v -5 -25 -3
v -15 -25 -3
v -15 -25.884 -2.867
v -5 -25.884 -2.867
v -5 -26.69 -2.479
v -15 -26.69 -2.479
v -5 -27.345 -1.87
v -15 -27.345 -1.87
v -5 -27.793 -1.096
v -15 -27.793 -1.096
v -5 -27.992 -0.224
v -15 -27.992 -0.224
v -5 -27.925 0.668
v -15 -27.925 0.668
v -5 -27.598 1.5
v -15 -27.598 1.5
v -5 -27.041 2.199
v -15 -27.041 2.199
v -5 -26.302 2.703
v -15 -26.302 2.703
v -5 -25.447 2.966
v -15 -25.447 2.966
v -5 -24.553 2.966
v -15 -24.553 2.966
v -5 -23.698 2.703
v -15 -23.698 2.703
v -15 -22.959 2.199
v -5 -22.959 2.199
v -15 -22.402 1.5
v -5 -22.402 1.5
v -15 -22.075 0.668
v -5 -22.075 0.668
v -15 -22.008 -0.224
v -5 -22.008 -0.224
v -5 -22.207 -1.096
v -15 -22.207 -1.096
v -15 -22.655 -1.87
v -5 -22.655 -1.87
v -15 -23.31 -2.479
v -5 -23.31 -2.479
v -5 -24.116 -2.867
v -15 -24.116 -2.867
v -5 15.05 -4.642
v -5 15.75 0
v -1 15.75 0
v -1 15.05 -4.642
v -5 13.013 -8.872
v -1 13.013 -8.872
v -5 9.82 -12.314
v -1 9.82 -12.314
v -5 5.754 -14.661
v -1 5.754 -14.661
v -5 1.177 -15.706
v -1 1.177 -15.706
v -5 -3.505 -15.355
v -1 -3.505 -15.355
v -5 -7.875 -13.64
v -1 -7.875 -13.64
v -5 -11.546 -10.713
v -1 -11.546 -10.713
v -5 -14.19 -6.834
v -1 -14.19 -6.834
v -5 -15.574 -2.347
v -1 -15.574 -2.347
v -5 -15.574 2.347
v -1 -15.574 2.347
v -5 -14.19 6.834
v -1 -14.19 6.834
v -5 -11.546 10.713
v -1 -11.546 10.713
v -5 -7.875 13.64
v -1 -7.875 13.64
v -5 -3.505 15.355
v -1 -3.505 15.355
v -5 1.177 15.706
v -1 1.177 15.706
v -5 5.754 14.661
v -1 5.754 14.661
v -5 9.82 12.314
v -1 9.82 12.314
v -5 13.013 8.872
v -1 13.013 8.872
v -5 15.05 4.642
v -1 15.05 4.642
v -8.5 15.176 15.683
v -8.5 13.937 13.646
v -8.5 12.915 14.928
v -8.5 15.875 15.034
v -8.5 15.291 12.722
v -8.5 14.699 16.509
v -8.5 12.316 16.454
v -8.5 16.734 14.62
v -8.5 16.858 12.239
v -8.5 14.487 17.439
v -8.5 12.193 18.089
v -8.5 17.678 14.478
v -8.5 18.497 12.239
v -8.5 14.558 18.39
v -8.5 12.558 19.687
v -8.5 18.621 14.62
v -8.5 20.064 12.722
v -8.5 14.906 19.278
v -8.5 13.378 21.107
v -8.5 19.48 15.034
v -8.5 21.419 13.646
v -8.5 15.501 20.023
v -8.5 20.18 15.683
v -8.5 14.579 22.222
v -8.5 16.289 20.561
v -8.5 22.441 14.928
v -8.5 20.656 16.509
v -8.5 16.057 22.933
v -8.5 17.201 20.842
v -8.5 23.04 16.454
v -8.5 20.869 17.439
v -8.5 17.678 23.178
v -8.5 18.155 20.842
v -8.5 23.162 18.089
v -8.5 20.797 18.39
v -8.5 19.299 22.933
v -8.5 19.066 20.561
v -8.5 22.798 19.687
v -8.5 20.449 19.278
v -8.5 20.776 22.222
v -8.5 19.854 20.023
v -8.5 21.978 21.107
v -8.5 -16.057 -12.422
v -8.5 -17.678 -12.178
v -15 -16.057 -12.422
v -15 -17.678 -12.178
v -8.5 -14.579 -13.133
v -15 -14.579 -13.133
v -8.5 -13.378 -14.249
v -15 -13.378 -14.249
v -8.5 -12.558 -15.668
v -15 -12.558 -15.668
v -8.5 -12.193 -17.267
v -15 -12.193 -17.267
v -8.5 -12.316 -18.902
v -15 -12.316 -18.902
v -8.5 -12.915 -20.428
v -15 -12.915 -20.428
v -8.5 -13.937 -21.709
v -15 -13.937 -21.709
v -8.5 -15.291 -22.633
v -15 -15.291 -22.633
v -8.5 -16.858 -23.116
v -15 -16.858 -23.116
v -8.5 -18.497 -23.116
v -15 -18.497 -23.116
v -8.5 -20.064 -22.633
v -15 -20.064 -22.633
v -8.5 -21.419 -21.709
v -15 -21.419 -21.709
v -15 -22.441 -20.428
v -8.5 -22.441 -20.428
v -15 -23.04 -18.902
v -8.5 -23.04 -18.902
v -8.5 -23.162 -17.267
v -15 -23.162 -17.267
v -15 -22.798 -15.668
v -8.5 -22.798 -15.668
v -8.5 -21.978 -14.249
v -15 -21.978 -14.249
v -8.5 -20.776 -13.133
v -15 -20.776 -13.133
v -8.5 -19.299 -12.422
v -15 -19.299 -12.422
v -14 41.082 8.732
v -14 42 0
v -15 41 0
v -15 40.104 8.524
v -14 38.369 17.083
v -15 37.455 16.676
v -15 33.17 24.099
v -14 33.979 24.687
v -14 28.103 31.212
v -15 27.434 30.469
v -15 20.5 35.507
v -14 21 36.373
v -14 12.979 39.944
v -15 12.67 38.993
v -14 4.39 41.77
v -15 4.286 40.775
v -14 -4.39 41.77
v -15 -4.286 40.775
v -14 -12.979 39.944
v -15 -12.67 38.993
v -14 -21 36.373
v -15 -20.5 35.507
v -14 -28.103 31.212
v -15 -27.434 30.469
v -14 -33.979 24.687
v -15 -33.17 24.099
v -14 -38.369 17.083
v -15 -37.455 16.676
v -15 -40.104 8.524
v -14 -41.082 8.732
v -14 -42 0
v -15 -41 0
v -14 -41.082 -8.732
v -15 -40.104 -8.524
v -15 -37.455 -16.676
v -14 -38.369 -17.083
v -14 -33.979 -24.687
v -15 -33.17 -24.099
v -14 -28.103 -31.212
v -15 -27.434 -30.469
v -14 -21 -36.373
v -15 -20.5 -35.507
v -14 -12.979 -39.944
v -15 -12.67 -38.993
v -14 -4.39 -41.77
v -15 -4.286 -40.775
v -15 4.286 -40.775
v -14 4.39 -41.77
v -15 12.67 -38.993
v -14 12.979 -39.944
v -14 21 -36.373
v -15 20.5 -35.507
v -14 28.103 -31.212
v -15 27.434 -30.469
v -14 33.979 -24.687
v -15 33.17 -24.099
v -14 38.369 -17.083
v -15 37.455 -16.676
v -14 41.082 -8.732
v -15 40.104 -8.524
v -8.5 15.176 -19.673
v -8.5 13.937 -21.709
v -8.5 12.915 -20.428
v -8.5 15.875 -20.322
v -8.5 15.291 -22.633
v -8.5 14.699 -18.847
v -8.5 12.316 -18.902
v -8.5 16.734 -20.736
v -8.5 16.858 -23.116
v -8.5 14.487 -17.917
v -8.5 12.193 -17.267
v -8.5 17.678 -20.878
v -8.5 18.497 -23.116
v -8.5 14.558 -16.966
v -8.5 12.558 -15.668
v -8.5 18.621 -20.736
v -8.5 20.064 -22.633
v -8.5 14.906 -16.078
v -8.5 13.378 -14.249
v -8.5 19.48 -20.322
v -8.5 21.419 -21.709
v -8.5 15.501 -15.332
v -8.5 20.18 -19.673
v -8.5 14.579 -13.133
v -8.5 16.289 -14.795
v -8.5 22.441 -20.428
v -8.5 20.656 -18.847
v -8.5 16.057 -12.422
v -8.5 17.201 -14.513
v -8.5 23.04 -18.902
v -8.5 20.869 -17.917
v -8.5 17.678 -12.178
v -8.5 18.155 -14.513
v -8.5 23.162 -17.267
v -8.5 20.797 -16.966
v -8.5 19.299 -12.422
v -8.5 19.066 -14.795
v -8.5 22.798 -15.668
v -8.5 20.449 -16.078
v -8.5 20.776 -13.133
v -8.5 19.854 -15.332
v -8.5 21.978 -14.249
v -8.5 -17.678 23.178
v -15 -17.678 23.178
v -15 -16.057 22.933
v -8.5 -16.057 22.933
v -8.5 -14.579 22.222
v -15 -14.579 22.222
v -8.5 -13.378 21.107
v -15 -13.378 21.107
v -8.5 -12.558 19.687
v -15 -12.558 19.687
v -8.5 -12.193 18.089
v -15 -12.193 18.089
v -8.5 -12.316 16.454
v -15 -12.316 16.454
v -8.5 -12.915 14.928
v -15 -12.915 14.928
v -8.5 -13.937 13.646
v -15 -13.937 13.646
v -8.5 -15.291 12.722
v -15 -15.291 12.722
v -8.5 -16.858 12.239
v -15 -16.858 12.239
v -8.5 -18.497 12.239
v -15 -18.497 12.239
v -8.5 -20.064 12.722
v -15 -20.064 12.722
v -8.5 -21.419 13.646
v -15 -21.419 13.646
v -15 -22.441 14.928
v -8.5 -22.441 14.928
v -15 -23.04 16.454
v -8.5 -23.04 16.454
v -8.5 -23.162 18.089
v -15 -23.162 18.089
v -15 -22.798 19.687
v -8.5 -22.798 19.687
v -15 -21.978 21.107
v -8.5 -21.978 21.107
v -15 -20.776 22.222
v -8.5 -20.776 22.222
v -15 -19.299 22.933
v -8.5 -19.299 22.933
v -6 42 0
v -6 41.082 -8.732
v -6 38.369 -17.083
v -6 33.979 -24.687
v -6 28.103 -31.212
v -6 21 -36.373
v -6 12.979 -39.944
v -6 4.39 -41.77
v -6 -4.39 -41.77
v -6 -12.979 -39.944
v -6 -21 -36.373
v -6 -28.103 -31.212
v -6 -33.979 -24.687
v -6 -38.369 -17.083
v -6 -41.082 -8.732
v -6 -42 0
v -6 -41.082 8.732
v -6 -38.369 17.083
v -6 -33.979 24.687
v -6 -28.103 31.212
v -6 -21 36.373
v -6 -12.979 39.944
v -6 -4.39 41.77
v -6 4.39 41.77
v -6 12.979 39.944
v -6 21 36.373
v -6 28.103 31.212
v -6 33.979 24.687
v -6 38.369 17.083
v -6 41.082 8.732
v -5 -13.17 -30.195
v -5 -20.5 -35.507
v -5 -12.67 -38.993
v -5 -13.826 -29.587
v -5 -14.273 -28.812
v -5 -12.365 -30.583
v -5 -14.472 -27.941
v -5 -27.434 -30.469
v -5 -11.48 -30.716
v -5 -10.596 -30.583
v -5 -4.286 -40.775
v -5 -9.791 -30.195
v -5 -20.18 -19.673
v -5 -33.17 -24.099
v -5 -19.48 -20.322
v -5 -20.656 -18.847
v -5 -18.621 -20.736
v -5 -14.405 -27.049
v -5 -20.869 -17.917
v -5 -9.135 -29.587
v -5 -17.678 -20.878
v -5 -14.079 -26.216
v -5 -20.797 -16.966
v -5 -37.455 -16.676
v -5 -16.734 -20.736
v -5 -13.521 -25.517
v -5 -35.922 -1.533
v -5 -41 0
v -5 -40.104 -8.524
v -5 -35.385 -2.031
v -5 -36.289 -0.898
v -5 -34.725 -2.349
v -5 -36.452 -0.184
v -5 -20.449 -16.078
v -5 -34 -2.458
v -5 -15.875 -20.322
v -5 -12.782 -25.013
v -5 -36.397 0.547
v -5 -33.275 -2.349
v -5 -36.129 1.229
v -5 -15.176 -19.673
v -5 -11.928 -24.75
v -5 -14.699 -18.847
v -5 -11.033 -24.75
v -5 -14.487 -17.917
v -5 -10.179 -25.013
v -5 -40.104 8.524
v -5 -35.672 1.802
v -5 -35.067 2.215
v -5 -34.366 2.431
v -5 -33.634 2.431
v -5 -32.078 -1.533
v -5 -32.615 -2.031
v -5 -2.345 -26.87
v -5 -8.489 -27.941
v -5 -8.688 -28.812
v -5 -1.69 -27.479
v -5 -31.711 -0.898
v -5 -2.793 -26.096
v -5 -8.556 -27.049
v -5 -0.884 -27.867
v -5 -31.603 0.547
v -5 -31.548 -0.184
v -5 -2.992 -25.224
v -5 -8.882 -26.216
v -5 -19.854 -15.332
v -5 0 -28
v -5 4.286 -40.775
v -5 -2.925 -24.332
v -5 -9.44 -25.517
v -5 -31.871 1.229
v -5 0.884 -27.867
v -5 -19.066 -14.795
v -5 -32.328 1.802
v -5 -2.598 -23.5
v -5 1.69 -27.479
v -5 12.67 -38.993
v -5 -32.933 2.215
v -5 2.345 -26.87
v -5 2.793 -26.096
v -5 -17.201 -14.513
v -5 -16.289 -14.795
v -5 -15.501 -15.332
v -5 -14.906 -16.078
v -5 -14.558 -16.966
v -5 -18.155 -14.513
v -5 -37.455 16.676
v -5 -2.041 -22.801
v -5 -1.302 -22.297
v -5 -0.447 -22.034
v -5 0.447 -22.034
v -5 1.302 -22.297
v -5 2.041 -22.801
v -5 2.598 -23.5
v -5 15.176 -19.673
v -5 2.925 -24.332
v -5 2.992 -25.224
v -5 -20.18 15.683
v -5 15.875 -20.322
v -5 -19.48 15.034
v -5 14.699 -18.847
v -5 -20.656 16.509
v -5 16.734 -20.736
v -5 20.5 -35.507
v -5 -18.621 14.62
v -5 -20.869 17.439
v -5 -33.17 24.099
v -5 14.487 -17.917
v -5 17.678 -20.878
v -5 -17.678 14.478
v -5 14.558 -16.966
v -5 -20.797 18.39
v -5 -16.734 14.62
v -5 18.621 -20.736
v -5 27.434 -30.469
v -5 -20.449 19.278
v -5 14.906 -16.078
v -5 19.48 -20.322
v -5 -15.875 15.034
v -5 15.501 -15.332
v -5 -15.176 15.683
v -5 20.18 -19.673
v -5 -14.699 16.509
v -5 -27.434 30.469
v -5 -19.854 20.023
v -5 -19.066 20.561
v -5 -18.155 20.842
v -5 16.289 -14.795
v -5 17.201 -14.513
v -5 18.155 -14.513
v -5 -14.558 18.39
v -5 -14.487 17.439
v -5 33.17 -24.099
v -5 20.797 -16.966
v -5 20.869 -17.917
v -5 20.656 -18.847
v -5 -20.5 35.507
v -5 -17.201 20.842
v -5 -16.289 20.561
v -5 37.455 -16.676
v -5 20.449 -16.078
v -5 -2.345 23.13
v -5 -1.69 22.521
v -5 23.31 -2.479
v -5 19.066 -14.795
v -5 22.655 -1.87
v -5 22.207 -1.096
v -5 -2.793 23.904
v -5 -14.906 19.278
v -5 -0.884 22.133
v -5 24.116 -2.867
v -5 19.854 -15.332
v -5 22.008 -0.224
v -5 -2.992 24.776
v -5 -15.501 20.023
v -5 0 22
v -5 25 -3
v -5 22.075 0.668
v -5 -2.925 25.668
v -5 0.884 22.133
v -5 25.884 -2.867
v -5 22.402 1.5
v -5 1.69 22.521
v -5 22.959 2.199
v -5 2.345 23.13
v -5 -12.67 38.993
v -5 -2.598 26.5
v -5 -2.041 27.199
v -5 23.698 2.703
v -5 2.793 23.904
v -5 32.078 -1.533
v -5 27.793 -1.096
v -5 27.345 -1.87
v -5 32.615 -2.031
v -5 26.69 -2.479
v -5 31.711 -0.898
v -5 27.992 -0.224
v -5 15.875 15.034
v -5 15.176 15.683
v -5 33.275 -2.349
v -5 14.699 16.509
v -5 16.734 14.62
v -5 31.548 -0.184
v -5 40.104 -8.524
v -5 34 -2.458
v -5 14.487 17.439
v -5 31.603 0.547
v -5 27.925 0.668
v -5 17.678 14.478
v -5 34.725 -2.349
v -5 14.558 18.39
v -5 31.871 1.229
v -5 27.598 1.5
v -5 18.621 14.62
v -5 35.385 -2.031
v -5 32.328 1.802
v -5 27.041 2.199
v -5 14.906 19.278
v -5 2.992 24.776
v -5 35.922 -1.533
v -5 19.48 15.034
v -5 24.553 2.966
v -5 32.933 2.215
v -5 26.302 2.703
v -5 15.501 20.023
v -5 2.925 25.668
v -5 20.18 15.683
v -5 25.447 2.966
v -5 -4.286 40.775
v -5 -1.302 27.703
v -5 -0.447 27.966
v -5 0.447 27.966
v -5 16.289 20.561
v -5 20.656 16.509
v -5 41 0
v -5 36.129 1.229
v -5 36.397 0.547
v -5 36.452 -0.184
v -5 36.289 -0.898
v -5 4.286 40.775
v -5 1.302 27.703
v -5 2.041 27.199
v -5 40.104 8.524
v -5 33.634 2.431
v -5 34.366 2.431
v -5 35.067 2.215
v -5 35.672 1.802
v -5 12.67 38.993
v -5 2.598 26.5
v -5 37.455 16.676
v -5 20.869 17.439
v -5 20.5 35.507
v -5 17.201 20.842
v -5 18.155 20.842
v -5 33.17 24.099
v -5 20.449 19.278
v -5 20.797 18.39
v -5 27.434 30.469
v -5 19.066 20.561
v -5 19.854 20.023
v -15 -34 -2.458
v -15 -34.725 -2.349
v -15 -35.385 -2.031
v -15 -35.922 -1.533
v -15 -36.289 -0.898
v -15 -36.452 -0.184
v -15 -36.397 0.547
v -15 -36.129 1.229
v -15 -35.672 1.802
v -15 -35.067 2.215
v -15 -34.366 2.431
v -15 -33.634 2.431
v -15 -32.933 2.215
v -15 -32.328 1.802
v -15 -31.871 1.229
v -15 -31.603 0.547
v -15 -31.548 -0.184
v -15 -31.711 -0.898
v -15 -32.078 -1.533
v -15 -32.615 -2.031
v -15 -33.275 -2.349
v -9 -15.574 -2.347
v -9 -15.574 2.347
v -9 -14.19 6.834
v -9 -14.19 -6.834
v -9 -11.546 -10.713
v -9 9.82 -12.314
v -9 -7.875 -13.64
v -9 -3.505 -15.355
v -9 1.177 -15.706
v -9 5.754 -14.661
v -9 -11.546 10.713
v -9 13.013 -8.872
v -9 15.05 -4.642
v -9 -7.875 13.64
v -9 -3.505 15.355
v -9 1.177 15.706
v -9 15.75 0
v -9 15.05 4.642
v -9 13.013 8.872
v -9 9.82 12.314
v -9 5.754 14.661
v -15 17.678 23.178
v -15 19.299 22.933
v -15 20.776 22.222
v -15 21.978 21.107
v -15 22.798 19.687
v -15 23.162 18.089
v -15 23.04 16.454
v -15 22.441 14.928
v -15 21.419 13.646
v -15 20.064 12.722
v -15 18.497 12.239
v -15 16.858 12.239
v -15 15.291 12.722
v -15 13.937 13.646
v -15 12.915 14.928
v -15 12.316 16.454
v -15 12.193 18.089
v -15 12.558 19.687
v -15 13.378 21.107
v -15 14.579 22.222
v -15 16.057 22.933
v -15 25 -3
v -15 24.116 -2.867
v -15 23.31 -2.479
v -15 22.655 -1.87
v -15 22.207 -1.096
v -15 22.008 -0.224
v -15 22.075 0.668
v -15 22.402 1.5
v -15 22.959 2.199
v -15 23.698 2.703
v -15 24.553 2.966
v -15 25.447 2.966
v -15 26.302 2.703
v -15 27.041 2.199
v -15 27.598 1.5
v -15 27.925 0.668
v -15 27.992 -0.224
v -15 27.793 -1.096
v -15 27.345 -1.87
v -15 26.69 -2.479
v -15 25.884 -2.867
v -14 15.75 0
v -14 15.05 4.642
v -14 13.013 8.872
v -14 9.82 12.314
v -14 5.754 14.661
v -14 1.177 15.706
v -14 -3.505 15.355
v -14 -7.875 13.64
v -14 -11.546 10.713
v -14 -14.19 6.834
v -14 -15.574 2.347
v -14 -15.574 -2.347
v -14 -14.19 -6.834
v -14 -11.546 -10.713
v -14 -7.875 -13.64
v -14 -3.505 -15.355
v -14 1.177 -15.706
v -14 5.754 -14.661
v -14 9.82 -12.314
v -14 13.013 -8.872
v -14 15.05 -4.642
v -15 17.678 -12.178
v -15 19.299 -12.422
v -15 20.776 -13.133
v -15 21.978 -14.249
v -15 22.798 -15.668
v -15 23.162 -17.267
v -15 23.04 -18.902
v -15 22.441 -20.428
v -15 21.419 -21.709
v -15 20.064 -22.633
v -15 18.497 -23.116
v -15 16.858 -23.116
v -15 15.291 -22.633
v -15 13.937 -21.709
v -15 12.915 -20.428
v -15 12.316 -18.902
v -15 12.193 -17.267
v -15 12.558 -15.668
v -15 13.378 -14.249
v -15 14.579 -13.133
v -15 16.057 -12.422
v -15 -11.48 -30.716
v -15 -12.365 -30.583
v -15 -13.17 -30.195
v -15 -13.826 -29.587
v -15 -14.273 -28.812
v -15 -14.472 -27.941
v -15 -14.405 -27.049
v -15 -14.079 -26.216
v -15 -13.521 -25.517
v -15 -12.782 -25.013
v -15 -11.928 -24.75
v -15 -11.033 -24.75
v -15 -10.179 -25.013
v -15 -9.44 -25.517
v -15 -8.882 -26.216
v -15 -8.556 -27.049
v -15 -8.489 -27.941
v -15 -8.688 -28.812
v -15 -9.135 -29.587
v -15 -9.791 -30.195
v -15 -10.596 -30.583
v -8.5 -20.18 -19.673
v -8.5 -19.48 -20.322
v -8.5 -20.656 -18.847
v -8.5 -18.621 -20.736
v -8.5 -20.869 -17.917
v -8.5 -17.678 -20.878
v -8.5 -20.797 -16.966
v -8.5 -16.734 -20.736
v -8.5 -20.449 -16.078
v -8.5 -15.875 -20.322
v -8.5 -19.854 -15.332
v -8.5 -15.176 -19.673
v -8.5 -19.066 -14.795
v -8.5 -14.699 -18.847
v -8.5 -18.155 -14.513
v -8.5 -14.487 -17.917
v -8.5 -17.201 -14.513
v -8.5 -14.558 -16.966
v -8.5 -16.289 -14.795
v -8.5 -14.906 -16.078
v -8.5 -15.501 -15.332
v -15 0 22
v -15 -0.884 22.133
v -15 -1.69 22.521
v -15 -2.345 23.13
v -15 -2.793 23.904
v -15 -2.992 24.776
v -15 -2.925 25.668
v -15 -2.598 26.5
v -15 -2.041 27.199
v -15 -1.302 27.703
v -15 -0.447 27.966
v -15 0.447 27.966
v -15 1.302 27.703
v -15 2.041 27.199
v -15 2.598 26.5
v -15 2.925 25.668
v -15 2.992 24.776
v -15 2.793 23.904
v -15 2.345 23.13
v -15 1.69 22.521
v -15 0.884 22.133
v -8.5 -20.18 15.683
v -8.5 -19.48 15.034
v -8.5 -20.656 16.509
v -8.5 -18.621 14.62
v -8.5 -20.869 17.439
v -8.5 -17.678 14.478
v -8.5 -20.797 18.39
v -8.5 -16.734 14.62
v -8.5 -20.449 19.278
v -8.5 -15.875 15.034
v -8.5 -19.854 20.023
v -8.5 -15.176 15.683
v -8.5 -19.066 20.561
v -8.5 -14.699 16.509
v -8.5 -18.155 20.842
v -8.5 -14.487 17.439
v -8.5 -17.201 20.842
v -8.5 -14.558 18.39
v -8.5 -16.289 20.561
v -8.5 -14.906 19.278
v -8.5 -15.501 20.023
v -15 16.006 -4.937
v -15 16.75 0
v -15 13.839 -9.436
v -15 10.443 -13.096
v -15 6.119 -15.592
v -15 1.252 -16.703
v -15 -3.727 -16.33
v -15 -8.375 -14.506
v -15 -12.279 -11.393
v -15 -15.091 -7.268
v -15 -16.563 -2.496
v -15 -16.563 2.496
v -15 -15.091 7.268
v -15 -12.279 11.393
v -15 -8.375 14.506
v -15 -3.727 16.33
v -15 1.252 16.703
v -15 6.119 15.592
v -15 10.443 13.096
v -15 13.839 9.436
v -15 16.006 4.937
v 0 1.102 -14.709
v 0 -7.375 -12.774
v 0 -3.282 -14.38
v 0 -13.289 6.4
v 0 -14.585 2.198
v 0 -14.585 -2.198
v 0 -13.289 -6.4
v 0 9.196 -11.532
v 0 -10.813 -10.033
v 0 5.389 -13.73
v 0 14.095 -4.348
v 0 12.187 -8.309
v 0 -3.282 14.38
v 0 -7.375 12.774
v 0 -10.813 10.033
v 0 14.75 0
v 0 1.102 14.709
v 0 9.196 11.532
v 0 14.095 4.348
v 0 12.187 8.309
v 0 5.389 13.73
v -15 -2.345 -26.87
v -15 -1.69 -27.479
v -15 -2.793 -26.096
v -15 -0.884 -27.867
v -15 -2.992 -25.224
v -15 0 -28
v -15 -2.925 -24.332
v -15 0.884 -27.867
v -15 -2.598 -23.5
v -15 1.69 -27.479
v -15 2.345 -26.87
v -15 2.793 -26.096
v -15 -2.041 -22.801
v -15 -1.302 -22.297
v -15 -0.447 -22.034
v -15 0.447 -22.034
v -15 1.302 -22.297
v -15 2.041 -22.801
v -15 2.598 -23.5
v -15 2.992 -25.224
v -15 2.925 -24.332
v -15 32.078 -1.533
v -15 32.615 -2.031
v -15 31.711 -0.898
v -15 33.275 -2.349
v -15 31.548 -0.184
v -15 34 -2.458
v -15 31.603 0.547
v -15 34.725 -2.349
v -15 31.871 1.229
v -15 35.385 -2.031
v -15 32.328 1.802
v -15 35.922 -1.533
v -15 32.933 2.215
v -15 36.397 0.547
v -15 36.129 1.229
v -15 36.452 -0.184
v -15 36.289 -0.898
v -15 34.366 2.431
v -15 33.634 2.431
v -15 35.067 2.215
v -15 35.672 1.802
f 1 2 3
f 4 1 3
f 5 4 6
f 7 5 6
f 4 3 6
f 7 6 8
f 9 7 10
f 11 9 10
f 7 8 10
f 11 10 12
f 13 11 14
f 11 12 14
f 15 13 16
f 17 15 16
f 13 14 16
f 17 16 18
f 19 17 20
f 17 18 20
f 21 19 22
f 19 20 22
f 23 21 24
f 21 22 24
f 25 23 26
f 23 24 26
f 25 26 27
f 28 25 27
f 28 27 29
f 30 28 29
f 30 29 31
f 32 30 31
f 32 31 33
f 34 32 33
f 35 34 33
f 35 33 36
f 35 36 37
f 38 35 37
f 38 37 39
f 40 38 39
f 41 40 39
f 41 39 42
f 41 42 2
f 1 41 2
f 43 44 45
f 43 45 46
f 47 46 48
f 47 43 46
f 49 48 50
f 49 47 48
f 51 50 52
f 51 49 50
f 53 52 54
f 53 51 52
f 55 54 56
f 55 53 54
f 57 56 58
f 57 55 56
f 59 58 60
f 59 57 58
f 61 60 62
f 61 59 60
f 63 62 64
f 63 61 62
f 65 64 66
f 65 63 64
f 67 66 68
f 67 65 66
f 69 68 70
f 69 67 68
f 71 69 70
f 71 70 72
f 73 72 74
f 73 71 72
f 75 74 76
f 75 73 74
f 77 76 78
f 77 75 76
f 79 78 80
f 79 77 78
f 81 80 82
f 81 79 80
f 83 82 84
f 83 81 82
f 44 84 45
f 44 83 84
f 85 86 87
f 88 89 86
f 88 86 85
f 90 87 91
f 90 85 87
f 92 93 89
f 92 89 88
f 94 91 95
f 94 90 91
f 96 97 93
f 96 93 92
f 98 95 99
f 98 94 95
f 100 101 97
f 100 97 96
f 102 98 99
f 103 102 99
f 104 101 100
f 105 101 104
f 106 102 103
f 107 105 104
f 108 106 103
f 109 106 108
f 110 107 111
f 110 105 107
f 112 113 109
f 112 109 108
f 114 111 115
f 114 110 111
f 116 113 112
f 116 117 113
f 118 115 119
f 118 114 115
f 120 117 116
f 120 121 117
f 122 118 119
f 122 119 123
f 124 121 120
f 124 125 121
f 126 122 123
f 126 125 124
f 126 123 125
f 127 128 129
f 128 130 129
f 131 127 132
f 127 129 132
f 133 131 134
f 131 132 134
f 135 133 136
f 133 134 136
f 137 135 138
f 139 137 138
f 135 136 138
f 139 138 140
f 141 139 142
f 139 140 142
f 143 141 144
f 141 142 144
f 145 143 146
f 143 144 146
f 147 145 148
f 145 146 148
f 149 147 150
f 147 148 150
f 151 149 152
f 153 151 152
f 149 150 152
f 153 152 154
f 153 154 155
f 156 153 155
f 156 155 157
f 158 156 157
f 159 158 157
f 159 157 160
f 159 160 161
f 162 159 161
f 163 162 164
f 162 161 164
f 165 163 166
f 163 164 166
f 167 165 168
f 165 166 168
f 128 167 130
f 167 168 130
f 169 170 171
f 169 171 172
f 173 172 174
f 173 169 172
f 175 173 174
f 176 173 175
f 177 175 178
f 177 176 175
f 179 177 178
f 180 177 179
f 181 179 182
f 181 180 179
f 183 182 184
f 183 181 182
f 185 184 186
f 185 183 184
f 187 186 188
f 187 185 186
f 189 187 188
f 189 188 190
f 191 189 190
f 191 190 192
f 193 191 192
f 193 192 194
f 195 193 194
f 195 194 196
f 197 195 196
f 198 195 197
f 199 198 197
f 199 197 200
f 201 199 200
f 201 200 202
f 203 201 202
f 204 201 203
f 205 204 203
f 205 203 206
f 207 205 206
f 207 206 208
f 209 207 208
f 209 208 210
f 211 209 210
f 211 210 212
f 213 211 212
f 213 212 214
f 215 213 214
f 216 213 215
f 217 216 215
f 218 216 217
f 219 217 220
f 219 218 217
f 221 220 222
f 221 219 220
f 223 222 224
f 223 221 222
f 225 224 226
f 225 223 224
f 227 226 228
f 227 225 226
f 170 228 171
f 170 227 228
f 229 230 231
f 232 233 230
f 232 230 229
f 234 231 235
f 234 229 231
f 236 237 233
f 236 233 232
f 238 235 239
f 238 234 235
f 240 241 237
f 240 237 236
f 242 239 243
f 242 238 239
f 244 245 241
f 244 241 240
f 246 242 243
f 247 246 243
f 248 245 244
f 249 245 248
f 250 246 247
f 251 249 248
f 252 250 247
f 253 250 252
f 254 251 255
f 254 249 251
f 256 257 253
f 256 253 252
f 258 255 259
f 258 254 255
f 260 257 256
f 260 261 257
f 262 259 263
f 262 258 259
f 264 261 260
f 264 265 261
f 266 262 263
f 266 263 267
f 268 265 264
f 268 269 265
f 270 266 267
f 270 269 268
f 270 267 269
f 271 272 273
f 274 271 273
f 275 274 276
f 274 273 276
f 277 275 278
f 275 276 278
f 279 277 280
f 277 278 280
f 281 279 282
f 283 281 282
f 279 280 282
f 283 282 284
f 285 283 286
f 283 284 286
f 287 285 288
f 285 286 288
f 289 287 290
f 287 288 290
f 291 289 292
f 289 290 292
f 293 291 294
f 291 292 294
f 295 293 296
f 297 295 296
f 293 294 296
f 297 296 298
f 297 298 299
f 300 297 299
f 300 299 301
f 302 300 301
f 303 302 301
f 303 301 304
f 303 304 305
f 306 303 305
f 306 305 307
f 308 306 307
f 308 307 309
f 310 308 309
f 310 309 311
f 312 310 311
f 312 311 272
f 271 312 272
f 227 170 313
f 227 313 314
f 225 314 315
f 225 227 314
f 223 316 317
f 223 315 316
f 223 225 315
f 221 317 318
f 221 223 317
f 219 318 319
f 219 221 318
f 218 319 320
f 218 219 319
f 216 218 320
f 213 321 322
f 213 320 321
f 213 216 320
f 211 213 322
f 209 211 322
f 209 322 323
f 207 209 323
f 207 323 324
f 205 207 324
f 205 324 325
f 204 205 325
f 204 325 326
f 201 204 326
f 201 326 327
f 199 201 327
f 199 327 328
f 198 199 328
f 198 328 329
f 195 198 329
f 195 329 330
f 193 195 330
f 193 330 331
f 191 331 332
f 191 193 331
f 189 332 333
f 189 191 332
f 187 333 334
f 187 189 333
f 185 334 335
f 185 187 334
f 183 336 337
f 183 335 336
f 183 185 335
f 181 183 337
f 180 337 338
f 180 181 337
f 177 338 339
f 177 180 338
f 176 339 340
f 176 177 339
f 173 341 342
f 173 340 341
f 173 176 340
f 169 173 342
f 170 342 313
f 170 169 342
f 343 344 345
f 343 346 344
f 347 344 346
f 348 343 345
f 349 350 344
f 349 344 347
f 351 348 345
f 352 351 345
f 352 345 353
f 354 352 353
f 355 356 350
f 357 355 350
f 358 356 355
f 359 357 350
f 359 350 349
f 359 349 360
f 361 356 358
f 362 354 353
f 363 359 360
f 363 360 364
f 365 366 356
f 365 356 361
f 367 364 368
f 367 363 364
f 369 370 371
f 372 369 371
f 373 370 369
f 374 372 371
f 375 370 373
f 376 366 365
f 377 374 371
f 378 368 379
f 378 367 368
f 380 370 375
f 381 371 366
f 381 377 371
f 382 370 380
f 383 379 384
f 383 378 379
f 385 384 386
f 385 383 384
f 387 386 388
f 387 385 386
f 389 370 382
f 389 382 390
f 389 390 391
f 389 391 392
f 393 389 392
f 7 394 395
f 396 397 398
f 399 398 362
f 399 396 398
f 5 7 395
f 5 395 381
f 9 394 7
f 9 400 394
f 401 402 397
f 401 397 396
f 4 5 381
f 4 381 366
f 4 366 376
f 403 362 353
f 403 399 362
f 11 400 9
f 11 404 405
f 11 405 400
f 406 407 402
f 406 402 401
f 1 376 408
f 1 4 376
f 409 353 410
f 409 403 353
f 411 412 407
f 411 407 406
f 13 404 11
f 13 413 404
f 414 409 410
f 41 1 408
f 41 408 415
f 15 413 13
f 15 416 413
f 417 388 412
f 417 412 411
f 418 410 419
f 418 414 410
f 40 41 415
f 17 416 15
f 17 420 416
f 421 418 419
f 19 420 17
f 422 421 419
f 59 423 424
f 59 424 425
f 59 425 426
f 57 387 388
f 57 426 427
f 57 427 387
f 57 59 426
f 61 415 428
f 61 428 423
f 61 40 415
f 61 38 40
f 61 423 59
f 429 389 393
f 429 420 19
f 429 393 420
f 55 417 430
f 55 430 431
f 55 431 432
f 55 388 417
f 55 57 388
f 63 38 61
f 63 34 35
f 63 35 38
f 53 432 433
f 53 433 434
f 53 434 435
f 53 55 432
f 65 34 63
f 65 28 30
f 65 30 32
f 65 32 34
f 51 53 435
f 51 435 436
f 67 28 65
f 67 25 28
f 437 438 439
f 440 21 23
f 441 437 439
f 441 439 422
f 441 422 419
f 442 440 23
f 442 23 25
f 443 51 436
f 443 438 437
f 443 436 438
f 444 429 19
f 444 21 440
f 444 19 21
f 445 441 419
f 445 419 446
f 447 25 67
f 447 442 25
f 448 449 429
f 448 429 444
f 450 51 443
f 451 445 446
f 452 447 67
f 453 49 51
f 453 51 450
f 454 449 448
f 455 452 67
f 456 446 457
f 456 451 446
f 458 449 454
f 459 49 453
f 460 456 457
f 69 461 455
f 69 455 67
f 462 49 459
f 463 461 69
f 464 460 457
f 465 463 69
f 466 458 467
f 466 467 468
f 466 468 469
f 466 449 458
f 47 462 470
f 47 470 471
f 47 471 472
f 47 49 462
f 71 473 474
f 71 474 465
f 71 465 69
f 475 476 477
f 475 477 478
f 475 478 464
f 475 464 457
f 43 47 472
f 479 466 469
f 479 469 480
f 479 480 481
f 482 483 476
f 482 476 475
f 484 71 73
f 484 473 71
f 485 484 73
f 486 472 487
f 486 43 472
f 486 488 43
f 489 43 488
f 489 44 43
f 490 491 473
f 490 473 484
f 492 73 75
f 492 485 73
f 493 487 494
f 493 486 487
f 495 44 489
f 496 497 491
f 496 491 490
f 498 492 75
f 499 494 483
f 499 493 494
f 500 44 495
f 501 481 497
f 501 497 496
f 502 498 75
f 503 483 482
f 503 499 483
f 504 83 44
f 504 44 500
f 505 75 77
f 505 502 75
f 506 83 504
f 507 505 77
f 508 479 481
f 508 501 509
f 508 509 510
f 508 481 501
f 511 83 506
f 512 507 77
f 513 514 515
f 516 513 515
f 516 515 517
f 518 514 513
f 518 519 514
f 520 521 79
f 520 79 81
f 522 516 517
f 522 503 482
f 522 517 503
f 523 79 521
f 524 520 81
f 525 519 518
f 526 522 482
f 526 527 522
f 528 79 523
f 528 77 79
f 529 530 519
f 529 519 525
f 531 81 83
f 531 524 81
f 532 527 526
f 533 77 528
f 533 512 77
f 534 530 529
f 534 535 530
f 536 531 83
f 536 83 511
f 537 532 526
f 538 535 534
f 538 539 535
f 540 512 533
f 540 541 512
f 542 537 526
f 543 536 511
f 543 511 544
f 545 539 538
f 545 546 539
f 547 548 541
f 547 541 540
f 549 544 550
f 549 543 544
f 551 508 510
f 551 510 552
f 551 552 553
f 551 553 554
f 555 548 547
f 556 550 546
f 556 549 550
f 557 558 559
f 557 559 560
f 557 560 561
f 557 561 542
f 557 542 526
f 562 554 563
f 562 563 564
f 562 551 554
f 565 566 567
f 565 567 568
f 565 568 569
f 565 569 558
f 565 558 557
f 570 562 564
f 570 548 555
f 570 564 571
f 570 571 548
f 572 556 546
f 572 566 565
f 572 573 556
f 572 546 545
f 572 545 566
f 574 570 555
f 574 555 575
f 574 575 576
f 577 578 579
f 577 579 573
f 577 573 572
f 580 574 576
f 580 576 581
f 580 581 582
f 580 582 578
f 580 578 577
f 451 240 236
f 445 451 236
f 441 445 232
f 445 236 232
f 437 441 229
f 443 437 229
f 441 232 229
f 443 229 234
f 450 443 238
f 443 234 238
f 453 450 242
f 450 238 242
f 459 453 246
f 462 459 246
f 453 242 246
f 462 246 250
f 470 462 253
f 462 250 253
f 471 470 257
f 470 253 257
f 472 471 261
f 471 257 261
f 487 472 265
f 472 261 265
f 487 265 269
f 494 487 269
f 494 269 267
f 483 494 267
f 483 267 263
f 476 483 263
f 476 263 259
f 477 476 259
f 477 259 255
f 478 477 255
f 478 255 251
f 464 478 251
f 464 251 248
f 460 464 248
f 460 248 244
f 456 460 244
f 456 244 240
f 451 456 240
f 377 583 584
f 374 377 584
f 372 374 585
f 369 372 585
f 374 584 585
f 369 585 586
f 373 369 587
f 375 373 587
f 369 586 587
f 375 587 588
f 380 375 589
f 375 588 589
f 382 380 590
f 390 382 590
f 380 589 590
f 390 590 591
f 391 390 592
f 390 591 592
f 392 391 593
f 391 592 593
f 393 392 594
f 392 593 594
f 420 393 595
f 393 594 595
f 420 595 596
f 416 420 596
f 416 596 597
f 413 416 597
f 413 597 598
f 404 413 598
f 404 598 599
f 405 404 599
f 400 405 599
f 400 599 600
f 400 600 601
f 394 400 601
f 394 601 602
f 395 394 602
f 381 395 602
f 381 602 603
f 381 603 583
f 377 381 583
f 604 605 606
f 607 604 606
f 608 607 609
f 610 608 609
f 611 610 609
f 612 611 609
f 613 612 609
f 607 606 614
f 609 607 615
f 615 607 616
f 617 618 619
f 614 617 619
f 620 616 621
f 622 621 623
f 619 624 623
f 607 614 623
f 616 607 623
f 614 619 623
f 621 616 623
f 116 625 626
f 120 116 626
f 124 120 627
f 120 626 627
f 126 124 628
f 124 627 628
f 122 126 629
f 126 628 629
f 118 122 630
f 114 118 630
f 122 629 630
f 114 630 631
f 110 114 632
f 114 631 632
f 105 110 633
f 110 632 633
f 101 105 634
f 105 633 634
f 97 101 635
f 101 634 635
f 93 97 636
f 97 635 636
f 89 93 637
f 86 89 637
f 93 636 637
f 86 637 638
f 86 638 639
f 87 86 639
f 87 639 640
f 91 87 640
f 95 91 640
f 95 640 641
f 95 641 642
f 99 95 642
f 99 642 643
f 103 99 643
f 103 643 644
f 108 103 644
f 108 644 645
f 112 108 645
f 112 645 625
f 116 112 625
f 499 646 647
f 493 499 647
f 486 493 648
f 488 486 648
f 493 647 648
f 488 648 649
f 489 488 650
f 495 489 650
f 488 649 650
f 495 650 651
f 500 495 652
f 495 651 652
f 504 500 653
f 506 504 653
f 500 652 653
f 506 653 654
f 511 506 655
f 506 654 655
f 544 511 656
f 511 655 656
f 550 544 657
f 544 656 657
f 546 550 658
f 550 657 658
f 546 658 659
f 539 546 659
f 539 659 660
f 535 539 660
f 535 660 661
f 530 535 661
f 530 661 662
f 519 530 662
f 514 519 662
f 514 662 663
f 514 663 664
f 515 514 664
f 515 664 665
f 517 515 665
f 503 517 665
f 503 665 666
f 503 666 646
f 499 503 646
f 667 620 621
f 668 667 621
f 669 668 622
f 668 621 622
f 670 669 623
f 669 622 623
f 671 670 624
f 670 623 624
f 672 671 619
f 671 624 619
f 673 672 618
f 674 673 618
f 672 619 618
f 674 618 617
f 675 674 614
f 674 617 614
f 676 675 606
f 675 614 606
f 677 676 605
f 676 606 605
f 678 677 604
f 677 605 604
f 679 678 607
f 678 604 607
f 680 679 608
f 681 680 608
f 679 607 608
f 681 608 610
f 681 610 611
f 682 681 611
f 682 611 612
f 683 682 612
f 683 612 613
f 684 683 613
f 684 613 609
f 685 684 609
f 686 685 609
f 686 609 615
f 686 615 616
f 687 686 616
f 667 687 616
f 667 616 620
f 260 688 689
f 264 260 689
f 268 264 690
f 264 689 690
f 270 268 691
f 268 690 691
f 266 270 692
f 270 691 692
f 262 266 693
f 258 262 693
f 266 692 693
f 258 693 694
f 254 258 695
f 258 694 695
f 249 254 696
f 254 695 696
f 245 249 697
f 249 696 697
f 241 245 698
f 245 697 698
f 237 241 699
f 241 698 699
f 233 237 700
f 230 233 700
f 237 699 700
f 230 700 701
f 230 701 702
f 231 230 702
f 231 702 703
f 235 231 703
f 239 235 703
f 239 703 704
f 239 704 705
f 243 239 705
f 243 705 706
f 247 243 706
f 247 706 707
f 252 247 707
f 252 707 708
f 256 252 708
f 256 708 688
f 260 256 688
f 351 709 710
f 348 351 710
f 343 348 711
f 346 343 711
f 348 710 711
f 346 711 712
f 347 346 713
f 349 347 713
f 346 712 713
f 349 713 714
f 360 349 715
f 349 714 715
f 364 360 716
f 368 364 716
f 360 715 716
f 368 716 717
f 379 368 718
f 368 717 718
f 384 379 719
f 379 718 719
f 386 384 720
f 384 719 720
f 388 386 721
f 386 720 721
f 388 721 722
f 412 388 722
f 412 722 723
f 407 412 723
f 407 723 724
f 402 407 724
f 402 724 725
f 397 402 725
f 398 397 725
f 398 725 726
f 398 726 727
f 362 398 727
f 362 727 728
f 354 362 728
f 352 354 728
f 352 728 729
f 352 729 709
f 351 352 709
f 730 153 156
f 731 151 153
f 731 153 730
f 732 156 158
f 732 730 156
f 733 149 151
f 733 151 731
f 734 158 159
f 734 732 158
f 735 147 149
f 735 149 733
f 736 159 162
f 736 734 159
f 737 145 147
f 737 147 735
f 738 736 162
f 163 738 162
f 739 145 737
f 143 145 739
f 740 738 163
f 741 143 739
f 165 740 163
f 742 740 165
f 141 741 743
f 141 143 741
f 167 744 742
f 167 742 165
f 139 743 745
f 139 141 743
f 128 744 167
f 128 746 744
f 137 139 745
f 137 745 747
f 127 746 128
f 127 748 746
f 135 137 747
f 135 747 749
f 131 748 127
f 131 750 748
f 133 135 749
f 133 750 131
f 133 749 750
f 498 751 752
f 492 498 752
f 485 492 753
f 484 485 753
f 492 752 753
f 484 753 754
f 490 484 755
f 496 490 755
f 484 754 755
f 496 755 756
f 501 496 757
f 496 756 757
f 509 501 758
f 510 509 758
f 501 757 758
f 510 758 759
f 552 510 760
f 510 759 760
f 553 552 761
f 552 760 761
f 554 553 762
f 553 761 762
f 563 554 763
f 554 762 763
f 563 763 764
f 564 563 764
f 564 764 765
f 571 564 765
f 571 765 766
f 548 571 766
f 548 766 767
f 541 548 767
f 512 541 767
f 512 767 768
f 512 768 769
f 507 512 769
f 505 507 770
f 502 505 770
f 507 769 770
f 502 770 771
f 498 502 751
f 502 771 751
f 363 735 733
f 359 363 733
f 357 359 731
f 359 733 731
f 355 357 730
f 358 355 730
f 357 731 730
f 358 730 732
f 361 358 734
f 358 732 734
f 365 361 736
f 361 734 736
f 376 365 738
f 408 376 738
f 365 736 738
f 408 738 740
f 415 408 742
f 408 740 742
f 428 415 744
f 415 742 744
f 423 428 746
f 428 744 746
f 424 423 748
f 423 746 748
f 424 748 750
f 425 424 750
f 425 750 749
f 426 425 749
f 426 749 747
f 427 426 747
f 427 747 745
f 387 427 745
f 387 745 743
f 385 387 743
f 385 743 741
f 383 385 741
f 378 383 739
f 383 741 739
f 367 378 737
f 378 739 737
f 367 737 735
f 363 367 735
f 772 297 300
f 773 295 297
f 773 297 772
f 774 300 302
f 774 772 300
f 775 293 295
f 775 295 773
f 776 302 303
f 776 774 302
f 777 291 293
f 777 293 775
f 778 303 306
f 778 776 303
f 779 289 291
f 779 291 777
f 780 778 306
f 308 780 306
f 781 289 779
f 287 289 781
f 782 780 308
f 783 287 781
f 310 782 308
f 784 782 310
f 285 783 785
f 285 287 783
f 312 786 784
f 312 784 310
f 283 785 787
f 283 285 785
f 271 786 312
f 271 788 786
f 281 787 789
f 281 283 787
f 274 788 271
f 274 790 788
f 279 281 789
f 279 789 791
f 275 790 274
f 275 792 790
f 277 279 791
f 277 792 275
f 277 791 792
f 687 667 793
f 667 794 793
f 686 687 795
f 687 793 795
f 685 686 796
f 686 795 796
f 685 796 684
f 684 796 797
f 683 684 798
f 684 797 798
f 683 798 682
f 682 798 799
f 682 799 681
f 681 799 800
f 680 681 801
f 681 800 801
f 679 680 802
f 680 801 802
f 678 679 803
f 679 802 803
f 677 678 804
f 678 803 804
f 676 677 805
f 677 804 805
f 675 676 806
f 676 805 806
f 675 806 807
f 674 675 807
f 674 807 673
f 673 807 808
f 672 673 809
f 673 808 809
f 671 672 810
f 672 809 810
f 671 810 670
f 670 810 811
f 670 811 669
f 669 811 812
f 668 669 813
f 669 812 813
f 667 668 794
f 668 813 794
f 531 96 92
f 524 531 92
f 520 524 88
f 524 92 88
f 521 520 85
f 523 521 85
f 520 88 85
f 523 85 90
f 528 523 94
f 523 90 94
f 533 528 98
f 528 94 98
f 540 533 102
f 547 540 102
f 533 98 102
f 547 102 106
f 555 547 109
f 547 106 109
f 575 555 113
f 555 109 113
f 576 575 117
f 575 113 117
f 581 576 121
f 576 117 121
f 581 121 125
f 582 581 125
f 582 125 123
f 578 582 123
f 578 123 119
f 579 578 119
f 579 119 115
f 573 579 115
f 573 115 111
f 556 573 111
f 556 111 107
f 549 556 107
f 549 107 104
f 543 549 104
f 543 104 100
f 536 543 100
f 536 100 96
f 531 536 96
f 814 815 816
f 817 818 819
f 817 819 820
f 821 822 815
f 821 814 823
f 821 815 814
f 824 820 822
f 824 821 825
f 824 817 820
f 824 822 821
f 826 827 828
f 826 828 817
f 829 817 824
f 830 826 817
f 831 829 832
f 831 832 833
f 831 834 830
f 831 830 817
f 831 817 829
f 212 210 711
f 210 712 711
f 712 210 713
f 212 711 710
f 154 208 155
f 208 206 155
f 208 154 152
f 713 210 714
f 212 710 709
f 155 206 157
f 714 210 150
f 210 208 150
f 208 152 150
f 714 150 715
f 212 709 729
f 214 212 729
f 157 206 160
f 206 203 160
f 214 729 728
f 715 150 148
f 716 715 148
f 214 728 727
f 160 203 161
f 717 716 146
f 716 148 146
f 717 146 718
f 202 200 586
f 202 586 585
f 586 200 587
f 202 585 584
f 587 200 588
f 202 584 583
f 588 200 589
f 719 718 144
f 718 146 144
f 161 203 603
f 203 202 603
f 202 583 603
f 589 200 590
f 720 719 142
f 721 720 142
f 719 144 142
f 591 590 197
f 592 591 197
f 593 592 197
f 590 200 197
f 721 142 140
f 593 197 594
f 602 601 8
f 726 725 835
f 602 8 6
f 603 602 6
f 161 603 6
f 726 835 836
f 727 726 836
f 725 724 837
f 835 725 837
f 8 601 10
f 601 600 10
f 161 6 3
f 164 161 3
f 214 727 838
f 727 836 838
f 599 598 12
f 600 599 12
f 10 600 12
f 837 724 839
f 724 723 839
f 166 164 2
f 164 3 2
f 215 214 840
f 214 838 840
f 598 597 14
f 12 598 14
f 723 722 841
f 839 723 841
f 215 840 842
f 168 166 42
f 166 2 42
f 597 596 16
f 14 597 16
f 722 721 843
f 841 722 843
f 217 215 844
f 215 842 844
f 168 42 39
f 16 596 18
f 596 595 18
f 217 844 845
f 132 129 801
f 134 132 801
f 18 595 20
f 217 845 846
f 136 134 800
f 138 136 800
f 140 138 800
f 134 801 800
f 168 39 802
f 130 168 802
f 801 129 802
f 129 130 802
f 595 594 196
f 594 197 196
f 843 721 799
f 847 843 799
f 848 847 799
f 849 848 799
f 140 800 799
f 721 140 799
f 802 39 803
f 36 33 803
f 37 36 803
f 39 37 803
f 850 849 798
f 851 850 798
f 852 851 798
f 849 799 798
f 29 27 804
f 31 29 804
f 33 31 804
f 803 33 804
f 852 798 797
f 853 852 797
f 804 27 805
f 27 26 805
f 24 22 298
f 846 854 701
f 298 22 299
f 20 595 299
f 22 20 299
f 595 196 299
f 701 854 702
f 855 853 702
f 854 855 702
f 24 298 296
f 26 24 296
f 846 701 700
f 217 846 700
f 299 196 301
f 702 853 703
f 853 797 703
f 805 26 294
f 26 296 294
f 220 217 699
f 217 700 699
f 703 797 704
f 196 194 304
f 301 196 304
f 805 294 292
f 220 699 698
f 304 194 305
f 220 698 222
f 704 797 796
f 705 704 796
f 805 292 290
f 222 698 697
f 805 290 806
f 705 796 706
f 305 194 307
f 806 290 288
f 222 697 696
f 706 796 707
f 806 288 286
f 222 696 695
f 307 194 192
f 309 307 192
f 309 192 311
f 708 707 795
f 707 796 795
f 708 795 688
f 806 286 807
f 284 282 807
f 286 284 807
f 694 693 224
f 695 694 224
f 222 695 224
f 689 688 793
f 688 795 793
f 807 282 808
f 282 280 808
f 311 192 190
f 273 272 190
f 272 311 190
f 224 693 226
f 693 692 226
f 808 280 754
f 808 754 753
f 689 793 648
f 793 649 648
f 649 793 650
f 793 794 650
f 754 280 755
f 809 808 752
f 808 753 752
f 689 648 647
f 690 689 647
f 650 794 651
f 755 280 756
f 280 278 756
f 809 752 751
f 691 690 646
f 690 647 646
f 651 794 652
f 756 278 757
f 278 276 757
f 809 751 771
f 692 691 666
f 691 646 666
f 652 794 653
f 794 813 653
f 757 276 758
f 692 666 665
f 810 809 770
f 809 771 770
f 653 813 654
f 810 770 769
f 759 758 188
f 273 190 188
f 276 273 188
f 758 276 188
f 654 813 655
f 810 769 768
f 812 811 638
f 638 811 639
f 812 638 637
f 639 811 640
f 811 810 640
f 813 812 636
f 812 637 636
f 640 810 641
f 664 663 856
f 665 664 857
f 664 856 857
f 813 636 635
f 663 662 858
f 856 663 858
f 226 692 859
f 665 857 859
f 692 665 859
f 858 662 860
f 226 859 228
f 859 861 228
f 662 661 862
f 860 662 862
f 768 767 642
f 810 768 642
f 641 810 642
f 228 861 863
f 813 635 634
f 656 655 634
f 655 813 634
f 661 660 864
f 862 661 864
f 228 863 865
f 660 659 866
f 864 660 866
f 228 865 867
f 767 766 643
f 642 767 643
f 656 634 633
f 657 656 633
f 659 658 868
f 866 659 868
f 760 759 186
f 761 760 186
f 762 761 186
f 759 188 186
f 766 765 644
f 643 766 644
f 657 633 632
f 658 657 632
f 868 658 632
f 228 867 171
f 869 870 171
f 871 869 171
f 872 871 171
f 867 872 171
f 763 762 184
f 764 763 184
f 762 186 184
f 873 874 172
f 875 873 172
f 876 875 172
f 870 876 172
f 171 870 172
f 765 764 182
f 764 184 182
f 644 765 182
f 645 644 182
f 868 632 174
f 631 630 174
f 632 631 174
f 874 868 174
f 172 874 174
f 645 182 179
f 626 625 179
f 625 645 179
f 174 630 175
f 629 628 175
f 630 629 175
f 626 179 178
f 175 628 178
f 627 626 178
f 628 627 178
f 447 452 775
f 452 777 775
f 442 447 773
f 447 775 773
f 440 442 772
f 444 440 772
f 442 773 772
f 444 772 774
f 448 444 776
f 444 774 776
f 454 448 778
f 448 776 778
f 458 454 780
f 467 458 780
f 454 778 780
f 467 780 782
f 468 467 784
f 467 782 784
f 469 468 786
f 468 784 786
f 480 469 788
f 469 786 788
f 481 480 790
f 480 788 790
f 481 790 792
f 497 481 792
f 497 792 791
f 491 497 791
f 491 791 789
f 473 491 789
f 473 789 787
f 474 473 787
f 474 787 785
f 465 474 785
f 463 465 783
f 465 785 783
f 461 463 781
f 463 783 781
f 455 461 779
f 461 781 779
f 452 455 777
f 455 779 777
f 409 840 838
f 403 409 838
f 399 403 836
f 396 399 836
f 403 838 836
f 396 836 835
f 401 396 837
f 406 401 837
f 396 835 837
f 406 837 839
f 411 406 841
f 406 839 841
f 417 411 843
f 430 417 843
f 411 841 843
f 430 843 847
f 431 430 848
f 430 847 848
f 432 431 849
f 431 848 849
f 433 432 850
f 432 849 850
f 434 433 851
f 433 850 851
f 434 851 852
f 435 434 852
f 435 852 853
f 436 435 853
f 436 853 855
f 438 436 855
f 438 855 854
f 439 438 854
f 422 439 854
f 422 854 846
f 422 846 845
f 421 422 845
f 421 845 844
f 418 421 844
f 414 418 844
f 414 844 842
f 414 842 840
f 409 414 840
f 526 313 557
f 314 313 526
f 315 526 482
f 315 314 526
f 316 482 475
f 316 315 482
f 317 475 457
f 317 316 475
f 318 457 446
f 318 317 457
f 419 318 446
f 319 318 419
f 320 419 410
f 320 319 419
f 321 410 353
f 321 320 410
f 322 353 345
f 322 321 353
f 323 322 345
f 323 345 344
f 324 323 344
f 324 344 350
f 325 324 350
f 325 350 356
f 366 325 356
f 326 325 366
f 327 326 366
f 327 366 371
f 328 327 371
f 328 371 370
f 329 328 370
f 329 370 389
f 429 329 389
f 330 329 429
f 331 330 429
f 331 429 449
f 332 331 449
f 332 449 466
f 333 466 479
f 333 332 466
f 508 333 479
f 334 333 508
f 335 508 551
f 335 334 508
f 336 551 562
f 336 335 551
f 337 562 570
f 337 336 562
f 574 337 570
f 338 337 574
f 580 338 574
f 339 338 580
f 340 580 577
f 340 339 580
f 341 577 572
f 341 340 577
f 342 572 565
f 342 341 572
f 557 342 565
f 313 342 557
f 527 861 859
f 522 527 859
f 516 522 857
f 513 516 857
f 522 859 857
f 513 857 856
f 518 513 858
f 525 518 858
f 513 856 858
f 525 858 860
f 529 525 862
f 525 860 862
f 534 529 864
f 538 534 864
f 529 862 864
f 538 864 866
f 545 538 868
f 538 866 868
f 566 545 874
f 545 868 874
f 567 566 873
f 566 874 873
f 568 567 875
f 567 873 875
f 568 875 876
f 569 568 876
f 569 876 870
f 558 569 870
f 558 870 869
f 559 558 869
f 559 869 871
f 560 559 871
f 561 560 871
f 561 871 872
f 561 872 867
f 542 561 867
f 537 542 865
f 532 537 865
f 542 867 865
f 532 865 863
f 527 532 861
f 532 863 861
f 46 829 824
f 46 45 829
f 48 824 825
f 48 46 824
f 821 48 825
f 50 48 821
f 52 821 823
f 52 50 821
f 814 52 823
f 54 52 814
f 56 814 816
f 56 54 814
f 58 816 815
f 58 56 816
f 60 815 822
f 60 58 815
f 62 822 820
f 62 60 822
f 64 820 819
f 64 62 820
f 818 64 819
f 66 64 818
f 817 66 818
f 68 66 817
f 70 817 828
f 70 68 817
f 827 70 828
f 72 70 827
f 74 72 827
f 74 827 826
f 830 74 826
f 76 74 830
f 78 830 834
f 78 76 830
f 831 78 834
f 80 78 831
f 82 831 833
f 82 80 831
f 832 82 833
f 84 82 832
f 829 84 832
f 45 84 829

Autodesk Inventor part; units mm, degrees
ref_plane "YZ Plane" through (0, 0, 0) normal (1, 0, 0) x (0, 1, 0)
ref_plane "XZ Plane" through (0, 0, 0) normal (0, 1, 0) x (-1, 0, 0)
ref_plane "XY Plane" through (0, 0, 0) normal (0, 0, 1) x (1, 0, 0)
sketch "Sketch1" plane through (0, 0, 0) normal (0, 0, 1) x (1, 0, 0)
  line L0 (-15, 41) -> (-15, 16.75)
  line L1 (-14, 15.75) -> (-9, 15.75)
  line L2 (-9, 15.75) -> (-9, 0)
  line L3 (-9, 0) -> (0, 0)
  line L4 (0, 0) -> (0, 14.75)
  line L5 (-1, 15.75) -> (-5, 15.75)
  line L6 (-5, 15.75) -> (-5, 41)
  line L7 (-6, 42) -> (-14, 42)
  line L8 (-5, 41) -> (-6, 42)
  line L9 (-15, 41) -> (-14, 42)
  line L10 (-14, 15.75) -> (-15, 16.75)
  line L11 (-1, 15.75) -> (0, 14.75)
  point P0 (-15, 42)
  point P1 (-15, 15.75)
  point P2 (0, 15.75)
  point P3 (-5, 42)
  point P4 (0, 7.375)
  point P5 (-4.5, 0)
  point P6 (-10, 42)
  point P7 (-11.5, 15.75)
  dimension "d1" = 6
  dimension "d2" = 15.75
  dimension "d3" = 5
  dimension "d4" = 15
  dimension "d5" = 1
  dimension "d6" = 1
  dimension "d7" = 1
  dimension "d8" = 1
  dimension "d9" = 1
  dimension "d10" = 1
  dimension "d11" = 1
  dimension "d12" = 1
  dimension "d13" = 42
  dimension "d14" = 15.75
revolve "Revolution1" add sketch "Sketch1" angle 360 about axis through (-9, 0, 0) along (1, 0, 0)
sketch "Sketch2" plane through (-5, 0, 0) normal (1, 0, 0) x (0, 0, -1)
  circle A0 centre (0, 0) radius 34
  circle A1 centre (0, 0) radius 30
  circle A2 centre (0, 0) radius 25
  circle A3 centre (0, 34) radius 2.5
  line L0 (0, 0) -> (42, 0)
  circle A4 centre (0, 0) radius 42 projected
  line L1 (27.7164, -11.4805) -> (0, 0)
  point P0 (0, -34)
  point P1 (0, 25)
  point P2 (0, -25)
  point P3 (-25, 0)
  point P4 (25, 0)
  point P5 (-17.6777, 17.6777)
  point P6 (17.6777, -17.6777)
  point P7 (-17.6777, -17.6777)
  point P8 (17.6777, 17.6777)
  dimension "d16" = 68
  dimension "d17" = 60
  dimension "d18" = 50
  dimension "d19" = 5
  dimension "d22" = 360
  dimension "d55" = -22.5
hole "Hole1" at (-5, 34, 0) at (-5, -34, 0) direction (-1, 0, 0) diameter 4.917 depth 10 thread size "M6x1" class "6H" standard "ISO Metric profile"
hole "Hole2" at (-5, 25, 0) at (-5, 0, -25) at (-5, -25, 0) at (-5, 0, 25) direction (-1, 0, 0) diameter 6 end up to surface
hole "Hole3" at (-5, 17.6777, -17.6777) at (-5, -17.6777, -17.6777) at (-5, -17.6777, 17.6777) at (-5, 17.6777, 17.6777) direction (-1, 0, 0) diameter 6.4 end up to surface
hole "Hole5" at (-5, -11.4805, -27.7164) direction (-1, 0, 0) diameter 6 end up to surface
sketch "Sketch4" plane through (-15, 0, 0) normal (-1, 0, 0) x (0, 0, 1)
  circle A0 centre (-17.6777, 17.6777) radius 3.2 projected
  circle A1 centre (-17.6777, 17.6777) radius 5.5
  circle A2 centre (-17.6777, -17.6777) radius 5.5
  circle A3 centre (17.6777, -17.6777) radius 5.5
  circle A4 centre (17.6777, 17.6777) radius 5.5
  point P0 (0, 0)
  dimension "d63" = 11
  dimension "d66" = 360
extrude "Extrusion1" cut sketch "Sketch4" against normal blind 6.5 contours A0 | A1 | A2 | A3 | A4
equation "\"d6\" = d5"
equation "\"d7\" = d5"
equation "\"d8\" = d7"
equation "\"d9\" = d5"
equation "\"d10\" = d9"
equation "\"d11\" = d5"
equation "\"d12\" = d11"
properties part number "UR5 Gripper Interface plate" material "Aluminum 6061"
